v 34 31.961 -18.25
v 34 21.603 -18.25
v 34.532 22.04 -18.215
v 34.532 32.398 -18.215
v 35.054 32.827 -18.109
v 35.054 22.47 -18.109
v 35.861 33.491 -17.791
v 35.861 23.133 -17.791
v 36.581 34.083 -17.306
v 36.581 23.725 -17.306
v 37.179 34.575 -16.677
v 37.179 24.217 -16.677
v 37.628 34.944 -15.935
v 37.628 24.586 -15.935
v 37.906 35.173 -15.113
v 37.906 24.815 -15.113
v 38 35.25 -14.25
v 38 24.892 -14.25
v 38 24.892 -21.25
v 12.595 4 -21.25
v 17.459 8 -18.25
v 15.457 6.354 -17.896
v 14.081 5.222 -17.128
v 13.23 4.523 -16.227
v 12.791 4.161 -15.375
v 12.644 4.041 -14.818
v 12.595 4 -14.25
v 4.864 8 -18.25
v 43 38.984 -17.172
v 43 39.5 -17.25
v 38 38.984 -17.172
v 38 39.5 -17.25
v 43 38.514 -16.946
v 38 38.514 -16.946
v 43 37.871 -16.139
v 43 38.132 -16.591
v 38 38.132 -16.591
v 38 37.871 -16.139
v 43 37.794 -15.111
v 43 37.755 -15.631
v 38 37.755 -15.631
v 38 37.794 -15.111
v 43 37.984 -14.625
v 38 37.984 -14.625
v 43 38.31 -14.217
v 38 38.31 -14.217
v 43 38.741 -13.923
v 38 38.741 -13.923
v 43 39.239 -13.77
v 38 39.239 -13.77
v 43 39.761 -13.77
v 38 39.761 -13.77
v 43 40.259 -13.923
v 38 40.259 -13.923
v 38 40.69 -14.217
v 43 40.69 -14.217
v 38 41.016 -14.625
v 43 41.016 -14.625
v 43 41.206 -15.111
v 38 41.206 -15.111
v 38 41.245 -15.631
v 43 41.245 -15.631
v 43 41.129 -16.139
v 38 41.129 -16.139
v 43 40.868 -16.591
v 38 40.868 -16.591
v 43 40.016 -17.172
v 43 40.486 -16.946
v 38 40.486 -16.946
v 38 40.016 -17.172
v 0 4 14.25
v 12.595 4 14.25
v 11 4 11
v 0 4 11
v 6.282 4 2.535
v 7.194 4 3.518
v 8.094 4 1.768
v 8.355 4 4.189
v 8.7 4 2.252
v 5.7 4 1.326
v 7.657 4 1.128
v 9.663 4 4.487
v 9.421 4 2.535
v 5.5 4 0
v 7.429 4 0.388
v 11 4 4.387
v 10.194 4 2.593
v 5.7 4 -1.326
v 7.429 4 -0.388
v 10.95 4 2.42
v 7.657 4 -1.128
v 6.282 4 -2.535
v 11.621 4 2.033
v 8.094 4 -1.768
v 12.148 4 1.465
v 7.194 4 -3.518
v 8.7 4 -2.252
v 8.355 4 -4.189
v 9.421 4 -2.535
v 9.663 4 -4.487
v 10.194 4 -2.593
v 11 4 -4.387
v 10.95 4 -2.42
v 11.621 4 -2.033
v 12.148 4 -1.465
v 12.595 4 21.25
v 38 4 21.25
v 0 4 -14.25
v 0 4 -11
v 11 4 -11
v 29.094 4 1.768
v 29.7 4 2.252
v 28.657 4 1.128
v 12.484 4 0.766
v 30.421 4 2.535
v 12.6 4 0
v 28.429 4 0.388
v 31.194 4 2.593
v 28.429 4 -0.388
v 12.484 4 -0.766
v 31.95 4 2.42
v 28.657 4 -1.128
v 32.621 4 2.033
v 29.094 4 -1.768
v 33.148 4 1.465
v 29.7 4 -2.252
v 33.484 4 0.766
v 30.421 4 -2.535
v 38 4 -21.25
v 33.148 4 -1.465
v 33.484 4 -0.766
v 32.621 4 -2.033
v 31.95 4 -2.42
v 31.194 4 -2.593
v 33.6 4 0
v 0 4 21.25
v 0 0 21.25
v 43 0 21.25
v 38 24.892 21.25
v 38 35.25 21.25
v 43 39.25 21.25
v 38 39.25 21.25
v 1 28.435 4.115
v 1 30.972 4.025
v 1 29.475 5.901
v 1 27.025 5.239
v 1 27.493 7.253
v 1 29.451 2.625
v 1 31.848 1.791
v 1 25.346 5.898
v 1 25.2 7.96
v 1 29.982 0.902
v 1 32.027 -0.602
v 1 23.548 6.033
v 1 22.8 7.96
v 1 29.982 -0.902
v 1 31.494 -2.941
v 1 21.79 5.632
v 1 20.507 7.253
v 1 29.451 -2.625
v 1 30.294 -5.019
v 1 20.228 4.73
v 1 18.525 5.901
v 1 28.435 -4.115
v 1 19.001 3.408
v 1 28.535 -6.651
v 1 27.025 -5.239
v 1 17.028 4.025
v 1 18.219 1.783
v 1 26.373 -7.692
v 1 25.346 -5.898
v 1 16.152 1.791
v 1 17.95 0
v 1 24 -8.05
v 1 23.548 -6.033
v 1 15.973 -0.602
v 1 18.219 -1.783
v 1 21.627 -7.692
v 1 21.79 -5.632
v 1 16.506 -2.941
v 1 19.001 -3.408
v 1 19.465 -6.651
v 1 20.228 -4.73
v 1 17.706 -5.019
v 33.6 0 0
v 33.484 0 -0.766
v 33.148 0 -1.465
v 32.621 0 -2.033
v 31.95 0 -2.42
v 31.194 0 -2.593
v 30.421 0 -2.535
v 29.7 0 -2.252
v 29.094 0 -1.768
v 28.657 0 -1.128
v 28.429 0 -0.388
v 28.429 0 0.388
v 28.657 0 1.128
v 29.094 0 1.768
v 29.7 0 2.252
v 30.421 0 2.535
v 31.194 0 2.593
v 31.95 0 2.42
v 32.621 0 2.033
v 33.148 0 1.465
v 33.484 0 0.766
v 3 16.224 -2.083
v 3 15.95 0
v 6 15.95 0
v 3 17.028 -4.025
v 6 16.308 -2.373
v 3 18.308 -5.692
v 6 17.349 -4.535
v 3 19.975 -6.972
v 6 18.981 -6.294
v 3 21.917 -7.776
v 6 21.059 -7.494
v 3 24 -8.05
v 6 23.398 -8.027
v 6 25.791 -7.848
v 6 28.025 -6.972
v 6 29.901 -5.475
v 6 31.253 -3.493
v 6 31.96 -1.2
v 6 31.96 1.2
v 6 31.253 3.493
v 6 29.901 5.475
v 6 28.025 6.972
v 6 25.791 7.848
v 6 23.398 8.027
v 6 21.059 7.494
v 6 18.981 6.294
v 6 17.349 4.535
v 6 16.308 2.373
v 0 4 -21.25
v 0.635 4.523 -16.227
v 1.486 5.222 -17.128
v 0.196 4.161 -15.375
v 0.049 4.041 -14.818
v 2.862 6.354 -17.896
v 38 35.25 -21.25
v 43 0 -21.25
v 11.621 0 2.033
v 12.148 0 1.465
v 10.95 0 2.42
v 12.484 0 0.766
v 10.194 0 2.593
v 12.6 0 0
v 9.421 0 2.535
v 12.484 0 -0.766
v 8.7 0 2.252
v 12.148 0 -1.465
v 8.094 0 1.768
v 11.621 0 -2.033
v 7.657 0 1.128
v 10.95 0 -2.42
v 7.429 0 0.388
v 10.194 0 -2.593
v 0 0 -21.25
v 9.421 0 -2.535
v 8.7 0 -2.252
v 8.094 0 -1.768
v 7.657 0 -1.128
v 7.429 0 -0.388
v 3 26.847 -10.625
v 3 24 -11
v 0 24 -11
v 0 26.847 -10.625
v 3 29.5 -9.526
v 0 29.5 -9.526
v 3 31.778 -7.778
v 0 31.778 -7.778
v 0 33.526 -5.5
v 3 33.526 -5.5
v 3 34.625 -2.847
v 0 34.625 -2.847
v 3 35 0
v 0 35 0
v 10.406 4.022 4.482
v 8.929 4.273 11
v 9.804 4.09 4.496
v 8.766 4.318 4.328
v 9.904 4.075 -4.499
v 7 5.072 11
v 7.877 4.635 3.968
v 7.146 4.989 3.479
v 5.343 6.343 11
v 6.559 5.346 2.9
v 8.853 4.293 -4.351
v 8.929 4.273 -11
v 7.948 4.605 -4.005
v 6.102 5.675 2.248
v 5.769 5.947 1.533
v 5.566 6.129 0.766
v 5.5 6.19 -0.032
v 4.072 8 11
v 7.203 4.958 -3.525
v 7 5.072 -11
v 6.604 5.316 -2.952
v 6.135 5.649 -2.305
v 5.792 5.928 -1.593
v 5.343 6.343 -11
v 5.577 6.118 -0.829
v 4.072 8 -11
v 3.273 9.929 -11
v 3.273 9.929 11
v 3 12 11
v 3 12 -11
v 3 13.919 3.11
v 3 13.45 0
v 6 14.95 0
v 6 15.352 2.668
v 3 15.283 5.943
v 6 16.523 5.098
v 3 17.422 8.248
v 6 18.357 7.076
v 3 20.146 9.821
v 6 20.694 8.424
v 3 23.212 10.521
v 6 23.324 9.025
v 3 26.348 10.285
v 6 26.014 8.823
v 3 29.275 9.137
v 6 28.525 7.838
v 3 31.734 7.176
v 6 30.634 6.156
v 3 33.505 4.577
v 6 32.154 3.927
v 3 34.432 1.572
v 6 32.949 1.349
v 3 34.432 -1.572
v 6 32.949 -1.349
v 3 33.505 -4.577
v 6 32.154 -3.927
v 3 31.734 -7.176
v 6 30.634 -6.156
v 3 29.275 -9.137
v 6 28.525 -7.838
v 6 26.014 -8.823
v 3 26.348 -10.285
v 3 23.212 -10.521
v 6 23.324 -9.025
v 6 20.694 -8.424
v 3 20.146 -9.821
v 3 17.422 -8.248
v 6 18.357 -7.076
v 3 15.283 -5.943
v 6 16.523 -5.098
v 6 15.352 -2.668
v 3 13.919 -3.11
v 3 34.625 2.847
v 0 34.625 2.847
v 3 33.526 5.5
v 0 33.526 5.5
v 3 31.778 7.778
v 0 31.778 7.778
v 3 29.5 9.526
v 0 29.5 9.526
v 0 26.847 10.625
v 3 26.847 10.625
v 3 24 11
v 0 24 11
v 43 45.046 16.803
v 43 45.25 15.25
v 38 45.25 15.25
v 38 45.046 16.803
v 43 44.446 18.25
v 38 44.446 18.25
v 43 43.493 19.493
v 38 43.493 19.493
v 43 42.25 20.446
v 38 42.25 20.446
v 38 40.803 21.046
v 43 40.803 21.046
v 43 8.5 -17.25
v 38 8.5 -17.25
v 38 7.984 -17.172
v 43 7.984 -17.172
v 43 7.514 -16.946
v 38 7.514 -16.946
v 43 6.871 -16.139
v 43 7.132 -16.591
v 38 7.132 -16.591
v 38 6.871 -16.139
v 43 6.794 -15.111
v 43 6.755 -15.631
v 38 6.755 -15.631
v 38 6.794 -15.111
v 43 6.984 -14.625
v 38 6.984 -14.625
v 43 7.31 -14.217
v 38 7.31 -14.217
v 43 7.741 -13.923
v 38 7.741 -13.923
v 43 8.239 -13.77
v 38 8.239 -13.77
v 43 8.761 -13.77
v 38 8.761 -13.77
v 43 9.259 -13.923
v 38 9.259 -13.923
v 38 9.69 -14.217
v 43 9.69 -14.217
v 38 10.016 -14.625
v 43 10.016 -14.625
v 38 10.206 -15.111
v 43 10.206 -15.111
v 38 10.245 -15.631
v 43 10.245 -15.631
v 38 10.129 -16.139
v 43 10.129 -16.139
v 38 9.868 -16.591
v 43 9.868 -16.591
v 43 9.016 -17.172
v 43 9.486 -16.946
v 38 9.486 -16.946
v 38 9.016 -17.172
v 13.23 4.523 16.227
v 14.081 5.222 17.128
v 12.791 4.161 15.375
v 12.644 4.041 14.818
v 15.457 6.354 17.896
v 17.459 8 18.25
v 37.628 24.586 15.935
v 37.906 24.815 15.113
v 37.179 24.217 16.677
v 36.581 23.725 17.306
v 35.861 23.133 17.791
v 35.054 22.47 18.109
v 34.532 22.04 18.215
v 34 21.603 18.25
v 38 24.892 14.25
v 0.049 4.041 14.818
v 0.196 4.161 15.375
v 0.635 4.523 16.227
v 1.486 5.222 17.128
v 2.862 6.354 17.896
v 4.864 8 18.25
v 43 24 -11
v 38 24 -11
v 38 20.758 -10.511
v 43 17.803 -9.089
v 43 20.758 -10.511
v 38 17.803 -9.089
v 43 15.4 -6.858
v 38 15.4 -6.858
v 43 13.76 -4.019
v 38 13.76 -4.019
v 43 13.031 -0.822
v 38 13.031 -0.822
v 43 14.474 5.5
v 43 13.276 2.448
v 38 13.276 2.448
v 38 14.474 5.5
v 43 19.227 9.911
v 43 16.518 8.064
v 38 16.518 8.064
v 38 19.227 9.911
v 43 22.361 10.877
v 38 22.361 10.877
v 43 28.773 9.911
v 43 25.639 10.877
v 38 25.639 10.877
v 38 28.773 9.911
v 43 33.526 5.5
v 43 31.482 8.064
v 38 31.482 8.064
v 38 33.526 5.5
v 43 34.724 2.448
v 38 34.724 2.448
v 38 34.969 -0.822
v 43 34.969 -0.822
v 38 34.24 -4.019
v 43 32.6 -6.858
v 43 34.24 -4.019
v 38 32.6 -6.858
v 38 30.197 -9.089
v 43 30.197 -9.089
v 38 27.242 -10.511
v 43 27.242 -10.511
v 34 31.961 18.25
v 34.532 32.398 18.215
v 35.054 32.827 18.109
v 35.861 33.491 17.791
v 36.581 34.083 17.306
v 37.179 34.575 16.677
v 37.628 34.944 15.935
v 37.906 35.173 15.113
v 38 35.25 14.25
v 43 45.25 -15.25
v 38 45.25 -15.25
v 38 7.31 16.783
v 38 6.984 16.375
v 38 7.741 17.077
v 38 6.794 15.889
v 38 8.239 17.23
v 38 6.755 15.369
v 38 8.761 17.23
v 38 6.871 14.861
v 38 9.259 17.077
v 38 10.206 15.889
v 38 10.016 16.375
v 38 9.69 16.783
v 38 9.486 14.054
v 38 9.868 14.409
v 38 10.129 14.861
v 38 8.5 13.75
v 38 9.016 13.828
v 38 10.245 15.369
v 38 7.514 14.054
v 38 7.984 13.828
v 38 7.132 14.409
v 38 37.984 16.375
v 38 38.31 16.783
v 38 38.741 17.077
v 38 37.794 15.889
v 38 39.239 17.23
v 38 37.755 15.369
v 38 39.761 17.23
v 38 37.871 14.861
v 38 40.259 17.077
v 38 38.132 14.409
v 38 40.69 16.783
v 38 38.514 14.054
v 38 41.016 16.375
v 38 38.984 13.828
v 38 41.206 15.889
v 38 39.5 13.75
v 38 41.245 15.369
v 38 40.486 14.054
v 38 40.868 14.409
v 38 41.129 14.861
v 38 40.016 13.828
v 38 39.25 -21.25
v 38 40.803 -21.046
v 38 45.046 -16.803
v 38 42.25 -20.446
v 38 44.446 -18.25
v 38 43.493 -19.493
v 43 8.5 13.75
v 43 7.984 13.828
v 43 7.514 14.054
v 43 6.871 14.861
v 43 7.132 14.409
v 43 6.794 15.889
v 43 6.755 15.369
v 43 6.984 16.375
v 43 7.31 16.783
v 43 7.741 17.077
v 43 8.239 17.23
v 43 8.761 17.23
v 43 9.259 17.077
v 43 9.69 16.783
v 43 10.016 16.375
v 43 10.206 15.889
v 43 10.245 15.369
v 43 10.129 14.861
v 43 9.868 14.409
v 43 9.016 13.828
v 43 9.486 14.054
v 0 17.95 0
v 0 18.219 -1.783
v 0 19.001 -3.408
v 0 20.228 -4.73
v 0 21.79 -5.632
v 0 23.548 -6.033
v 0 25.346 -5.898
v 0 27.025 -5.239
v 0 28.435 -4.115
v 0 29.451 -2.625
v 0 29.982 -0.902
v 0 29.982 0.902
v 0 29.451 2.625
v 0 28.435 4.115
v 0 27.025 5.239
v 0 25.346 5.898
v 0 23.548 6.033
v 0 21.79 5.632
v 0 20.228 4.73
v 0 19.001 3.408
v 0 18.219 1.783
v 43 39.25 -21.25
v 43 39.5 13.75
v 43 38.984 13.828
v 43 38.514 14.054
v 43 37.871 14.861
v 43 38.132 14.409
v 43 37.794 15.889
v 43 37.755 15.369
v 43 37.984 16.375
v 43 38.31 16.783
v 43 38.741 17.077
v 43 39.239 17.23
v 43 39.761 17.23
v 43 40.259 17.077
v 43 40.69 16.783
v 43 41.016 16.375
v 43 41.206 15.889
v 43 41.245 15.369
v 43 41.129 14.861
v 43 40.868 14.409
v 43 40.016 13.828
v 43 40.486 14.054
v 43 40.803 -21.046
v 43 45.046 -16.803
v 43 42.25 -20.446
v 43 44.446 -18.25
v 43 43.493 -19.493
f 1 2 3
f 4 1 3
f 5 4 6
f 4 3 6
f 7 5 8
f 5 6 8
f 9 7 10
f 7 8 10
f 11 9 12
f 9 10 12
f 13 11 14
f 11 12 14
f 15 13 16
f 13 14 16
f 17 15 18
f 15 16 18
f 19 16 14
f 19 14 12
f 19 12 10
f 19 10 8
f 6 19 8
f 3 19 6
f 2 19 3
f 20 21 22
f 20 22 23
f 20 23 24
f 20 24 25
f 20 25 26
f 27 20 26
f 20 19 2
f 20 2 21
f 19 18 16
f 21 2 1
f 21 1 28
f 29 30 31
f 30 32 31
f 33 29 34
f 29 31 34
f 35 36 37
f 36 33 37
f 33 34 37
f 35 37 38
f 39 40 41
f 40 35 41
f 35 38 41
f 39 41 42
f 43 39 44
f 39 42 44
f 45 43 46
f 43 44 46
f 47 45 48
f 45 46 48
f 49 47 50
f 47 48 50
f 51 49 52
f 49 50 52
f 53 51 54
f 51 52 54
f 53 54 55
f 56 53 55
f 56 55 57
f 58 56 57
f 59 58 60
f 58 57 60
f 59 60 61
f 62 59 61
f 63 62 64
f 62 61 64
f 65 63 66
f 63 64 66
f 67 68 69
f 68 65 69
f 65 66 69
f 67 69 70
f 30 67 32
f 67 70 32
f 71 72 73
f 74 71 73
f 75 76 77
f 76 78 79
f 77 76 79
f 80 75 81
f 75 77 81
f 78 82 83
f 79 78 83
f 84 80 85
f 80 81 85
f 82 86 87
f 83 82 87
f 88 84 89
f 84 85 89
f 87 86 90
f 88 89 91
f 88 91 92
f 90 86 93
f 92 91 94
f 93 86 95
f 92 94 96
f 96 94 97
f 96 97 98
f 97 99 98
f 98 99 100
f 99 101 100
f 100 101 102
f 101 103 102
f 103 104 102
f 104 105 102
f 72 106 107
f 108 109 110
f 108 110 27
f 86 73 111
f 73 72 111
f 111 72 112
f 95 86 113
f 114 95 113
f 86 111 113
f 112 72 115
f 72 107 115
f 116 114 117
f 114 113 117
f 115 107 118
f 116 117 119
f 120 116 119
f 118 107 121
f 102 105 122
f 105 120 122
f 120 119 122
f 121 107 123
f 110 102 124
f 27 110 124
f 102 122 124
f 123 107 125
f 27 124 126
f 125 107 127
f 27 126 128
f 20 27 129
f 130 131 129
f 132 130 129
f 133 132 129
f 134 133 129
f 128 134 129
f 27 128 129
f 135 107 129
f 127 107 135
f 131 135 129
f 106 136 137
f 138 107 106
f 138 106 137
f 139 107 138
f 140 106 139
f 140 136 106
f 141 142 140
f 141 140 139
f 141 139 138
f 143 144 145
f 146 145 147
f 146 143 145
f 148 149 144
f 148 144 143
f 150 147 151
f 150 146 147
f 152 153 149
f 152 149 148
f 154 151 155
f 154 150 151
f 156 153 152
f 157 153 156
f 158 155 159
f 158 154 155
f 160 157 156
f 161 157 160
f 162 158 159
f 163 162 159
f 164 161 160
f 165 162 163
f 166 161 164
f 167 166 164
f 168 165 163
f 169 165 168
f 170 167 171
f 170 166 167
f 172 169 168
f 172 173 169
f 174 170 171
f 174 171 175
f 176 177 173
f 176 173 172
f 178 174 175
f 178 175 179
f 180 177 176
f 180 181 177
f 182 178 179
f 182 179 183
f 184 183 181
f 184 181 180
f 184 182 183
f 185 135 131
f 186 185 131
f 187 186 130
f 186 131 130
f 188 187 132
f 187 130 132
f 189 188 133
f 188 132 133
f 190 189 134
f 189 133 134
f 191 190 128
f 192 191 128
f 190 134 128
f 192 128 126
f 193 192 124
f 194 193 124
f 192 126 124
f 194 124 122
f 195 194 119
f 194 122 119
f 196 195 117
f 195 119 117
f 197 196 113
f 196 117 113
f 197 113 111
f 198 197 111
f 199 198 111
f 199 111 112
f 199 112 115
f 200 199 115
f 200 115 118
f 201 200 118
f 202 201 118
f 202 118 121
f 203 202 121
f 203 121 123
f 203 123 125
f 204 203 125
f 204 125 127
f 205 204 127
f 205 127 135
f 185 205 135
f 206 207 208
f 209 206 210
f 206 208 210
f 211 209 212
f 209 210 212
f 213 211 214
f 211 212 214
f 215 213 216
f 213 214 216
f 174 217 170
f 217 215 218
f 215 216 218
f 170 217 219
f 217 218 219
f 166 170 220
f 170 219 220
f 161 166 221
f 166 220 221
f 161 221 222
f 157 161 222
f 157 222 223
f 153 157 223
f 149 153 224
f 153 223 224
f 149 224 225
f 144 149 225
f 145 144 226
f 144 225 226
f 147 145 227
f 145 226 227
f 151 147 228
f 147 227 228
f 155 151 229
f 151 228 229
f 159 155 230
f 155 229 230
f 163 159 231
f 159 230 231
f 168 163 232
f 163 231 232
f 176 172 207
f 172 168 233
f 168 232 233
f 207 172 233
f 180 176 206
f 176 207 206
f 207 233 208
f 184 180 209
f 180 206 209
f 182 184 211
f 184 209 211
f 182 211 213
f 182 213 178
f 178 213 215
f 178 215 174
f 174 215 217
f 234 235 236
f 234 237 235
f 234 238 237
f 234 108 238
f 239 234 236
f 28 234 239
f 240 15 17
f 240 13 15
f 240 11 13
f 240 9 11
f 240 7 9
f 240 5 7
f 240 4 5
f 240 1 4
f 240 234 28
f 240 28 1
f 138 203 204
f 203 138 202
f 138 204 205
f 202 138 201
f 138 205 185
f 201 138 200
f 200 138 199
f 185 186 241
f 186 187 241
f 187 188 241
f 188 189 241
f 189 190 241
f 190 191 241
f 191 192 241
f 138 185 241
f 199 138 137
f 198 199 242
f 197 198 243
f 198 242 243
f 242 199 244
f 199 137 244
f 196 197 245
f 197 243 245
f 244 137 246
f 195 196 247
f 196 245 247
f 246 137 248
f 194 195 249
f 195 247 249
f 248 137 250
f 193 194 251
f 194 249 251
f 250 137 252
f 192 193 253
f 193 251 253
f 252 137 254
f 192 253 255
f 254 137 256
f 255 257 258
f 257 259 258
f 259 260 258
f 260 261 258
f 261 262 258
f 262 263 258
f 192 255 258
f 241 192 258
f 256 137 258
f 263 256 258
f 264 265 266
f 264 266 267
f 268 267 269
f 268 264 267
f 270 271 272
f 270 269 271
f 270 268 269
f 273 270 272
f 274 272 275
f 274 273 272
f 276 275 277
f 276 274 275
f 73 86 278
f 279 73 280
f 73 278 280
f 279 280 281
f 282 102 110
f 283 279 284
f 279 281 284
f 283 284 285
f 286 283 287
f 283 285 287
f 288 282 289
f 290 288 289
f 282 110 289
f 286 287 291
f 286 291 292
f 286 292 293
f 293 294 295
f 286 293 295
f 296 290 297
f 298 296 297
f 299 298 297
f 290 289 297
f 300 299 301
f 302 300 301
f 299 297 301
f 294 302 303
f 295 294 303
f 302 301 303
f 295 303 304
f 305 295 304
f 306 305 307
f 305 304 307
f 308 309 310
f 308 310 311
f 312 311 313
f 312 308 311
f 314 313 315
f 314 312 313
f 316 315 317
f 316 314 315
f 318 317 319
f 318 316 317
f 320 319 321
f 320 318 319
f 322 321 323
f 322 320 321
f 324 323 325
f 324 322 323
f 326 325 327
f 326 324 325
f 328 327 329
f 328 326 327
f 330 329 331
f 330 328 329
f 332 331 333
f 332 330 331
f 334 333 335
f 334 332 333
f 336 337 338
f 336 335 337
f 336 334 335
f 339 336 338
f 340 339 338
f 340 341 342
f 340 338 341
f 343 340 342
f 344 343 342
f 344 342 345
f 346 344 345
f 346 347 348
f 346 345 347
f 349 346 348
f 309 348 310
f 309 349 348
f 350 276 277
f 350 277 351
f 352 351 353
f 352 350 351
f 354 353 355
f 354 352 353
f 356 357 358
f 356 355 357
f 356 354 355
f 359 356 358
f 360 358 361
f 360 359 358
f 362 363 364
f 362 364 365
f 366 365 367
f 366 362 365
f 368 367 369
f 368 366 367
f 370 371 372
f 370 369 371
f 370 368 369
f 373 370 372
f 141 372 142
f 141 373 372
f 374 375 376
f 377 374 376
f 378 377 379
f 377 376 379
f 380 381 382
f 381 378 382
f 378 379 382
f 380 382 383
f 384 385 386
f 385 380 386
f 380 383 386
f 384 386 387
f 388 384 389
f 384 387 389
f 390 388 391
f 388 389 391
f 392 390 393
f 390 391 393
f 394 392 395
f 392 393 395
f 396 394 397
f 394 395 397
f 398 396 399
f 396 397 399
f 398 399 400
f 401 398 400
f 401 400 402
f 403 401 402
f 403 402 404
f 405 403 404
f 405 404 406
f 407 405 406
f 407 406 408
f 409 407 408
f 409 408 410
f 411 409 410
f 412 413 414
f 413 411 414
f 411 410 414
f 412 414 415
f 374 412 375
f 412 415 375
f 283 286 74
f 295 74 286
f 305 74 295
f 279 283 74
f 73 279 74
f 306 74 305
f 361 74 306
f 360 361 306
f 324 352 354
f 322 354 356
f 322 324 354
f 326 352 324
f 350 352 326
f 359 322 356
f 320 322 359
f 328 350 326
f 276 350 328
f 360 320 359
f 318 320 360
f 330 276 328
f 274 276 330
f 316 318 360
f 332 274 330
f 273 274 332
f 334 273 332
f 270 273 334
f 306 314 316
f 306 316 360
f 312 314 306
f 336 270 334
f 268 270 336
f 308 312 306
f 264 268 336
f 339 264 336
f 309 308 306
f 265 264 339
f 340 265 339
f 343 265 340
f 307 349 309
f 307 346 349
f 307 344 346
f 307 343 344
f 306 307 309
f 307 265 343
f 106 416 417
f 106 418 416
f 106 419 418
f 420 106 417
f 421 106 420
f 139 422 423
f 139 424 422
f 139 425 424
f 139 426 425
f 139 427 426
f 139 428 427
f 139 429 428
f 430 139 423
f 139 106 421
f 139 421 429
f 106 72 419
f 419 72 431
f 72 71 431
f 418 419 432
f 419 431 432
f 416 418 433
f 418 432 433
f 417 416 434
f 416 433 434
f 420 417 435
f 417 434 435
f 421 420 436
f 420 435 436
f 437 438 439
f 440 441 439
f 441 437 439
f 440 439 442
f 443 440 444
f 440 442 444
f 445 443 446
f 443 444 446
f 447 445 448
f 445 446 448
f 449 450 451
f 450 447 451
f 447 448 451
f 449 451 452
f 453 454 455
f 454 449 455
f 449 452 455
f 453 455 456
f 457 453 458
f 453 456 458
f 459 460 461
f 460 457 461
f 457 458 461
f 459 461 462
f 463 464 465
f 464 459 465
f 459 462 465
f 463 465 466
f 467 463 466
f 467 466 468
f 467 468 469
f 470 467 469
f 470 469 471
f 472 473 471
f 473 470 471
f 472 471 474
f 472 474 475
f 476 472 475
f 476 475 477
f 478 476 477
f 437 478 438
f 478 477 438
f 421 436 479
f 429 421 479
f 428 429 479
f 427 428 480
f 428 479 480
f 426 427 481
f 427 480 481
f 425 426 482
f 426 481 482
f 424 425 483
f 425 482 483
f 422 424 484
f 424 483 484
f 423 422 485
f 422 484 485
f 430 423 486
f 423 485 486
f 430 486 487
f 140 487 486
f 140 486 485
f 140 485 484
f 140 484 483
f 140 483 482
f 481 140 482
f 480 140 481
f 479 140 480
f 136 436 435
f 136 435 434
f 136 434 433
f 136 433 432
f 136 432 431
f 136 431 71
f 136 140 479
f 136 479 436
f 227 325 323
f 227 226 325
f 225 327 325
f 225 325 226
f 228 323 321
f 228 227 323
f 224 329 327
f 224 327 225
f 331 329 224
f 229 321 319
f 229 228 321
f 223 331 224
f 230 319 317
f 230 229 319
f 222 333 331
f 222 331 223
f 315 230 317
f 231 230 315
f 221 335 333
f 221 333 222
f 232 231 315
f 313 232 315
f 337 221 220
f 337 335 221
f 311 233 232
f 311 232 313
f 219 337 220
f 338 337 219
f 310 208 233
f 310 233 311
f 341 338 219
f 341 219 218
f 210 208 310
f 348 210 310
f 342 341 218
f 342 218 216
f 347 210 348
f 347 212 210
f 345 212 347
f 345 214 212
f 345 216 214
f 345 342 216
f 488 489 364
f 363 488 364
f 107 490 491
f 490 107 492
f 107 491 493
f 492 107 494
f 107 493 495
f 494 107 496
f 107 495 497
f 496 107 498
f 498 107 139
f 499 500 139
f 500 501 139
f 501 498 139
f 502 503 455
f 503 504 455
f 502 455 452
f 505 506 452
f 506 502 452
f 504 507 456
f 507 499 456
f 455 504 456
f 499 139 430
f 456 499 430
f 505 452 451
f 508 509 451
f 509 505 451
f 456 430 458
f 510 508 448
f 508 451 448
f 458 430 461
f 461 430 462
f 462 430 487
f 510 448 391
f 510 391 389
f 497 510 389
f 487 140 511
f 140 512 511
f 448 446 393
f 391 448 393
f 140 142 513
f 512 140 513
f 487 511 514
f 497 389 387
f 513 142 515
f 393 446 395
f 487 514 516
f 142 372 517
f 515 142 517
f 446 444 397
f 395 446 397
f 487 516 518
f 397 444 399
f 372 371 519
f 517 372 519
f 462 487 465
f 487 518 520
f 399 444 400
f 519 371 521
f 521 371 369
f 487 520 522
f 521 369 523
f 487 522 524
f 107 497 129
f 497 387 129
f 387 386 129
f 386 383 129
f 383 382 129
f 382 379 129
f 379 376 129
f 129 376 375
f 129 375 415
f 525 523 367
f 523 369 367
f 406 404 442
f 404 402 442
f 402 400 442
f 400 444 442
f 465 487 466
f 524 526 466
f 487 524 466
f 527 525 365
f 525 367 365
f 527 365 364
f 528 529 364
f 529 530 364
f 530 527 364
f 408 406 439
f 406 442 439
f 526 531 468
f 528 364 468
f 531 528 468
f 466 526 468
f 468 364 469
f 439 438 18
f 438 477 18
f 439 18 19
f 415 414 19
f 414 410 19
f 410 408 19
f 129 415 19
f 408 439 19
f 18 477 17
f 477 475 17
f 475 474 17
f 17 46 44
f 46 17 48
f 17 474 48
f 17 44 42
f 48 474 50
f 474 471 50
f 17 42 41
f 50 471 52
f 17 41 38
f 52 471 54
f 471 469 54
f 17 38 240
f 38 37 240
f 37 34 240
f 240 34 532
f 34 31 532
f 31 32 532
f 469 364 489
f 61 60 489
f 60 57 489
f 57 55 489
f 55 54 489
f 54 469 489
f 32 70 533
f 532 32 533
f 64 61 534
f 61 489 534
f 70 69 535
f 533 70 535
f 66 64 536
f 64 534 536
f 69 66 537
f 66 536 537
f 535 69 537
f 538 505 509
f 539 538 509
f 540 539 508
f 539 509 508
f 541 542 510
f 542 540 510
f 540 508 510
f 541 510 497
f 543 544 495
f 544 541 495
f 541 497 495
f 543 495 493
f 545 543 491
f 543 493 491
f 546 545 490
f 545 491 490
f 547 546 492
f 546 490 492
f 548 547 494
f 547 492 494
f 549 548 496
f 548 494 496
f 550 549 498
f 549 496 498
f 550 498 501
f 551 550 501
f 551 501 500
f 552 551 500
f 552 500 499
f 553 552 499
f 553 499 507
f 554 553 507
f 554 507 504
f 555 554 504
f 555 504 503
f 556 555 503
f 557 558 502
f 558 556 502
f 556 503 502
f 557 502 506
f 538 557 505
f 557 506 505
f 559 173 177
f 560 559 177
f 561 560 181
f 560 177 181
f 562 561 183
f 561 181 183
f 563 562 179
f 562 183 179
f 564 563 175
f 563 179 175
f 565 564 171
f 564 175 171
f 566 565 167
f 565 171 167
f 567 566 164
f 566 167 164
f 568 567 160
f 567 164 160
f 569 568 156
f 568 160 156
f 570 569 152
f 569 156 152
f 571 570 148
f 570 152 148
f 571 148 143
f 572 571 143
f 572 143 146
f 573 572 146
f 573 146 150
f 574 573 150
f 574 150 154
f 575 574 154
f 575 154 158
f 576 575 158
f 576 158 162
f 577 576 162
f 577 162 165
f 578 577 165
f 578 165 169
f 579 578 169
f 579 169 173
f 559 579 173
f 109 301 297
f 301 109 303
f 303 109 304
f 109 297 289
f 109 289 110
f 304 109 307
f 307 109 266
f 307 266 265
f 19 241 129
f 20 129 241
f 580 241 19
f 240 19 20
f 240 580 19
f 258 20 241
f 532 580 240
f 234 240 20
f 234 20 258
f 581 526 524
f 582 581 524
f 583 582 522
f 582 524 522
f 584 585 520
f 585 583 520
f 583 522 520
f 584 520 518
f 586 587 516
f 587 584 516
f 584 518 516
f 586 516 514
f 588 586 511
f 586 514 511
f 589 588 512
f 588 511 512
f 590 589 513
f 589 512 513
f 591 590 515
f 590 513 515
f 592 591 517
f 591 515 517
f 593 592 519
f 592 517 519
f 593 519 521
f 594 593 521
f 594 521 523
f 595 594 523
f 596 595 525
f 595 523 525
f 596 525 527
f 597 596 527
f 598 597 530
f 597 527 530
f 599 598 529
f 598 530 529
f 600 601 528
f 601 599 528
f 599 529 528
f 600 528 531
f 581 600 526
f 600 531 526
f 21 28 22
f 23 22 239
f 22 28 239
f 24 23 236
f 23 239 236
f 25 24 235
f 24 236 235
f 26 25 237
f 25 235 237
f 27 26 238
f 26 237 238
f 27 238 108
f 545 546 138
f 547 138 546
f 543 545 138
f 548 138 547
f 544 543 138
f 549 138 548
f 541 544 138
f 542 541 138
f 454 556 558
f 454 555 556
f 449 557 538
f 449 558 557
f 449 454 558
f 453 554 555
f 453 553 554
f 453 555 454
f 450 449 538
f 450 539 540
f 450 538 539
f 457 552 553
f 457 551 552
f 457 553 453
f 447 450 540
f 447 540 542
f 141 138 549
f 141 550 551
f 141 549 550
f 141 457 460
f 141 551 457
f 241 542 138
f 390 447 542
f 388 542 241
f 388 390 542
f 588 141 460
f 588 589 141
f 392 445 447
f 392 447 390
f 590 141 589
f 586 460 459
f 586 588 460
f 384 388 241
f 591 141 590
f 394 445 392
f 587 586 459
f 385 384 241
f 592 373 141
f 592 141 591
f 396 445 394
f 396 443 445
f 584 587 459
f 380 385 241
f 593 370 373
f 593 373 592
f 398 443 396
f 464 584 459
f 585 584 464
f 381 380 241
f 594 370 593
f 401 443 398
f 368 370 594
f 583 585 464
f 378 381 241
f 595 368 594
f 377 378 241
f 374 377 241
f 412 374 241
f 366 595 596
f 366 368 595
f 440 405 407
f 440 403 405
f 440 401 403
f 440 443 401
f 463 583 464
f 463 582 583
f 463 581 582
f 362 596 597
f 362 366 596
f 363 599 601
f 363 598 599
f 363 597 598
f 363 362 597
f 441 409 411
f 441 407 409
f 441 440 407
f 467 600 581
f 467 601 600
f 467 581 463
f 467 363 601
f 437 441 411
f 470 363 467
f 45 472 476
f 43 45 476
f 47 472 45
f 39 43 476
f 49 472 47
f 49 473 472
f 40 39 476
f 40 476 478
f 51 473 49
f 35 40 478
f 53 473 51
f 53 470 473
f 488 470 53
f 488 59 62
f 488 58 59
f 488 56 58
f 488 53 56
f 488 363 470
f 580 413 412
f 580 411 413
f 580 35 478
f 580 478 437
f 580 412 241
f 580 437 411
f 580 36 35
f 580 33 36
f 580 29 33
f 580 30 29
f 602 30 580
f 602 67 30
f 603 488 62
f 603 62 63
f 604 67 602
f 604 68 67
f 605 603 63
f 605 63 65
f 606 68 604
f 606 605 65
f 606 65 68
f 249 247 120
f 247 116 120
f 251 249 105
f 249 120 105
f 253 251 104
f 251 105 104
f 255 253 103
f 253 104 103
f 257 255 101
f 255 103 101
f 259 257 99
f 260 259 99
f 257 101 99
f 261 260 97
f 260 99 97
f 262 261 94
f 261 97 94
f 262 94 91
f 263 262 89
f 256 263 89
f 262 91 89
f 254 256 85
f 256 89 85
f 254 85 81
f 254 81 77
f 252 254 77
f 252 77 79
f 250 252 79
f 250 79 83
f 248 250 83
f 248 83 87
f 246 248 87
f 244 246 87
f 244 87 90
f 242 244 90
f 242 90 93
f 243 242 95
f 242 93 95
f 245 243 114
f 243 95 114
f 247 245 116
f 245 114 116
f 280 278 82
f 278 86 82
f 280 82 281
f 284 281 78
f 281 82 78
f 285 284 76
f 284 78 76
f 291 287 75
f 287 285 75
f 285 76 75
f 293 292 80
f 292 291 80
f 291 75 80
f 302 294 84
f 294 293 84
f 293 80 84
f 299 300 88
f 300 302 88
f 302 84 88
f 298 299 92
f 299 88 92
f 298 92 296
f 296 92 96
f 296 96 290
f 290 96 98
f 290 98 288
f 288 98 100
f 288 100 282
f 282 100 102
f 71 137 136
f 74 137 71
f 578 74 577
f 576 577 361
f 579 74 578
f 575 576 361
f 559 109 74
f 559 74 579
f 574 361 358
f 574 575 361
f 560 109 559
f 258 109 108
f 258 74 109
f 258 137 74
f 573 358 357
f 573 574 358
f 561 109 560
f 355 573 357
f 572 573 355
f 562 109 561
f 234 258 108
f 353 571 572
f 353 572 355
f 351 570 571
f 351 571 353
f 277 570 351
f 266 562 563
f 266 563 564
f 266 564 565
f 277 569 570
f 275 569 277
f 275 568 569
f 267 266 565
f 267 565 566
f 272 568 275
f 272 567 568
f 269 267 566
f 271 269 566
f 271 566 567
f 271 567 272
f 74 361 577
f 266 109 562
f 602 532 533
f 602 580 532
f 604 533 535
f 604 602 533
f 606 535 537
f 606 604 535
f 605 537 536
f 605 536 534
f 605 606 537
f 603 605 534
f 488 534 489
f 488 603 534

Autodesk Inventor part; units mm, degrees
ref_plane "YZ Plane" through (0, 0, 0) normal (1, 0, 0) x (0, 1, 0)
ref_plane "XZ Plane" through (0, 0, 0) normal (0, 1, 0) x (-1, 0, 0)
ref_plane "XY Plane" through (0, 0, 0) normal (0, 0, 1) x (1, 0, 0)
sketch "Sketch3" plane through (0, 0, 0) normal (0, 0, 1) x (1, 0, 0)
  line L0 (0, 0) -> (0, 35)
  line L1 (0, 35) -> (3, 35)
  line L2 (3, 35) -> (3, 4)
  line L3 (3, 4) -> (38, 4)
  line L4 (38, 4) -> (38, 0)
  line L5 (38, 0) -> (0, 0)
  line L6 (0, 25) -> (3, 25) construction
  dimension "d0" = 10
  dimension "d1" = 25
  dimension "d2" = 35
  dimension "d3" = 4
  dimension "d4" = 3
extrude "Extrusion1" add sketch "Sketch3" along normal mid plane 22
sketch "Sketch4" plane through (3, 4, -11) normal (1, 0, 0) x (0, 0, -1)
  line L0 (0, 31) -> (-22, 31) construction
  line L1 (-11, 31) -> (-11, 20) construction
  circle A0 centre (-11, 20) radius 8.05
  point P0 (-11, -4)
  dimension "d7" = 11
  dimension "d8" = 16.1
extrude "Extrusion2" cut sketch "Sketch4" against normal through all
fillet "Fillet3" radius 8 1 edges at (3, 4, 0)
sketch "Sketch5" plane through (3, 4, -11) normal (0, 1, 0) x (1, 0, 0)
  line L0 (35, 0) -> (35, -22) construction
  line L1 (35, -11) -> (0, -11) construction
  line L2 (0, 0) -> (0, -22) construction
  circle A0 centre (7, -11) radius 2.6
  circle A1 centre (28, -11) radius 2.6
  point P0 (-3, -11)
  dimension "d11" = 7
  dimension "d12" = 7
  dimension "d13" = 5.2
extrude "Extrusion3" cut sketch "Sketch5" along normal mid plane 24.75
sketch "Sketch6" plane through (0, 0, 0) normal (0, 0, 1) x (1, 0, 0)
  line L0 (3, 15.95) -> (0, 15.95) construction
  line L1 (0, 15.95) -> (0, 17.95)
  line L2 (0, 17.95) -> (1, 17.95)
  line L3 (1, 17.95) -> (1, 15.95)
  line L4 (0, 15.95) -> (0, 32.05) construction
  line L5 (1, 15.95) -> (0, 15.95)
  line L6 (3, 32.05) -> (3, 15.95) construction
  line L7 (3, 15.95) -> (6, 15.95)
  line L8 (6, 15.95) -> (6, 14.95)
  line L9 (6, 14.95) -> (3, 13.45)
  line L10 (3, 13.45) -> (3, 15.95)
  line L11 (0, 24) -> (3, 24) construction
  point P0 (0, 0)
  dimension "d16" = 1
  dimension "d17" = 2
  dimension "d18" = 5
  dimension "d19" = 2.5
  dimension "d20" = 1
revolve "Revolution1" add sketch "Sketch6" angle 360 about axis through (0, 24, 0) along (1, 0, 0)
fillet "Fillet1" radius 11 2 edges at (1.5, 35, 11) (1.5, 35, -11)
sketch "Sketch7" plane through (38, 0, 11) normal (1, 0, 0) x (0, 0, -1)
  circle A0 centre (11, 24) radius 6.05 construction
  line L0 (-10.25, 2.75) -> (32.25, 2.75) construction
  line L1 (32.25, 2.75) -> (32.25, 45.25)
  line L2 (32.25, 45.25) -> (-10.25, 45.25)
  line L3 (-10.25, 45.25) -> (-10.25, 2.75)
  line L4 (-10.25, 2.75) -> (32.25, 45.25) construction
  line L5 (32.25, 2.75) -> (-10.25, 45.25) construction
  line L6 (-10.25, 2.75) -> (-10.25, 0)
  line L7 (-10.25, 0) -> (32.25, 0)
  line L8 (32.25, 0) -> (32.25, 2.75)
  line L9 (22, 0) -> (0, 0) projected
  circle A1 centre (11, 24) radius 11
  line L10 (26.5, 8.5) -> (-4.5, 8.5) construction
  line L11 (-4.5, 8.5) -> (-4.5, 39.5) construction
  line L12 (-4.5, 39.5) -> (26.5, 39.5) construction
  line L13 (26.5, 39.5) -> (26.5, 8.5) construction
  line L14 (26.5, 8.5) -> (-4.5, 39.5) construction
  line L15 (-4.5, 8.5) -> (26.5, 39.5) construction
  circle A2 centre (-4.5, 39.5) radius 1.75
  circle A3 centre (-4.5, 8.5) radius 1.75
  circle A4 centre (26.5, 8.5) radius 1.75
  circle A5 centre (26.5, 39.5) radius 1.75
  point P0 (11, 0)
  point P1 (11, 0)
  dimension "d23" = 42.5
  dimension "d24" = 22
  dimension "d25" = 31
  dimension "d26" = 3.5
extrude "Extrusion4" add sketch "Sketch7" along normal blind 5
sketch "Sketch8" plane through (38, 0, 11) normal (-1, 0, 0) x (0, 0, 1)
  line L0 (10.25, 0) -> (0, 0)
  line L1 (0, 0) -> (0, 4)
  line L2 (0, 4) -> (10.25, 4)
  line L3 (10.25, 4) -> (10.25, 0)
  line L4 (-22, 4) -> (-22, 0) projected
  line L5 (-32.25, 0) -> (-32.25, 45.25) projected
  line L6 (-22, 4) -> (-32.25, 4)
  line L7 (-32.25, 4) -> (-32.25, 0)
  line L8 (-32.25, 0) -> (-22, 0)
  line L9 (-22, 0) -> (-22, 4)
  point P0 (-11, 0)
extrude "Extrusion5" add sketch "Sketch8" along normal up to surface (38 mm away)
sketch "Sketch9" plane through (38, 4, -21.25) normal (0, 0, -1) x (-1, 0, 0)
  line L0 (0, 9) -> (0, 31) projected
  line L1 (0, 20.8923) -> (25.405, 0)
  line L2 (0, 0) -> (38, 0) projected
  line L3 (38, 0) -> (0, 31.25)
  line L4 (0, 0) -> (0, 41.25) projected
  point P0 (38, -4)
  point P1 (0, 28)
  dimension "d31" = 8
  dimension "d40" = 10
extrude "Extrusion6" add sketch "Sketch9" against normal blind 3 contours L0 L4 L3 L2 L1
fillet "Fillet2" radius 4 2 edges at (38, 30.0711, -18.25) (6.2975, 4, -18.25)
mirror "Mirror1" about plane through (0, 0, 0) normal (0, 0, 1) of "Extrusion6", "Fillet2"
sketch "Sketch10" plane through (0, 4, -11) normal (0, 1, 0) x (1, 0, 0)
  circle A0 centre (10, -11) radius 2.6 projected
  circle A1 centre (10, -11) radius 4.5
  point P0 (0, -11)
  dimension "d37" = 9
extrude "Extrusion7" cut sketch "Sketch10" along normal blind 7 contours A0 | A1
fillet "Fillet4" radius 6 2 edges at (40.5, 45.25, 21.25) (40.5, 45.25, -21.25)
properties part number "Winder_driver"
